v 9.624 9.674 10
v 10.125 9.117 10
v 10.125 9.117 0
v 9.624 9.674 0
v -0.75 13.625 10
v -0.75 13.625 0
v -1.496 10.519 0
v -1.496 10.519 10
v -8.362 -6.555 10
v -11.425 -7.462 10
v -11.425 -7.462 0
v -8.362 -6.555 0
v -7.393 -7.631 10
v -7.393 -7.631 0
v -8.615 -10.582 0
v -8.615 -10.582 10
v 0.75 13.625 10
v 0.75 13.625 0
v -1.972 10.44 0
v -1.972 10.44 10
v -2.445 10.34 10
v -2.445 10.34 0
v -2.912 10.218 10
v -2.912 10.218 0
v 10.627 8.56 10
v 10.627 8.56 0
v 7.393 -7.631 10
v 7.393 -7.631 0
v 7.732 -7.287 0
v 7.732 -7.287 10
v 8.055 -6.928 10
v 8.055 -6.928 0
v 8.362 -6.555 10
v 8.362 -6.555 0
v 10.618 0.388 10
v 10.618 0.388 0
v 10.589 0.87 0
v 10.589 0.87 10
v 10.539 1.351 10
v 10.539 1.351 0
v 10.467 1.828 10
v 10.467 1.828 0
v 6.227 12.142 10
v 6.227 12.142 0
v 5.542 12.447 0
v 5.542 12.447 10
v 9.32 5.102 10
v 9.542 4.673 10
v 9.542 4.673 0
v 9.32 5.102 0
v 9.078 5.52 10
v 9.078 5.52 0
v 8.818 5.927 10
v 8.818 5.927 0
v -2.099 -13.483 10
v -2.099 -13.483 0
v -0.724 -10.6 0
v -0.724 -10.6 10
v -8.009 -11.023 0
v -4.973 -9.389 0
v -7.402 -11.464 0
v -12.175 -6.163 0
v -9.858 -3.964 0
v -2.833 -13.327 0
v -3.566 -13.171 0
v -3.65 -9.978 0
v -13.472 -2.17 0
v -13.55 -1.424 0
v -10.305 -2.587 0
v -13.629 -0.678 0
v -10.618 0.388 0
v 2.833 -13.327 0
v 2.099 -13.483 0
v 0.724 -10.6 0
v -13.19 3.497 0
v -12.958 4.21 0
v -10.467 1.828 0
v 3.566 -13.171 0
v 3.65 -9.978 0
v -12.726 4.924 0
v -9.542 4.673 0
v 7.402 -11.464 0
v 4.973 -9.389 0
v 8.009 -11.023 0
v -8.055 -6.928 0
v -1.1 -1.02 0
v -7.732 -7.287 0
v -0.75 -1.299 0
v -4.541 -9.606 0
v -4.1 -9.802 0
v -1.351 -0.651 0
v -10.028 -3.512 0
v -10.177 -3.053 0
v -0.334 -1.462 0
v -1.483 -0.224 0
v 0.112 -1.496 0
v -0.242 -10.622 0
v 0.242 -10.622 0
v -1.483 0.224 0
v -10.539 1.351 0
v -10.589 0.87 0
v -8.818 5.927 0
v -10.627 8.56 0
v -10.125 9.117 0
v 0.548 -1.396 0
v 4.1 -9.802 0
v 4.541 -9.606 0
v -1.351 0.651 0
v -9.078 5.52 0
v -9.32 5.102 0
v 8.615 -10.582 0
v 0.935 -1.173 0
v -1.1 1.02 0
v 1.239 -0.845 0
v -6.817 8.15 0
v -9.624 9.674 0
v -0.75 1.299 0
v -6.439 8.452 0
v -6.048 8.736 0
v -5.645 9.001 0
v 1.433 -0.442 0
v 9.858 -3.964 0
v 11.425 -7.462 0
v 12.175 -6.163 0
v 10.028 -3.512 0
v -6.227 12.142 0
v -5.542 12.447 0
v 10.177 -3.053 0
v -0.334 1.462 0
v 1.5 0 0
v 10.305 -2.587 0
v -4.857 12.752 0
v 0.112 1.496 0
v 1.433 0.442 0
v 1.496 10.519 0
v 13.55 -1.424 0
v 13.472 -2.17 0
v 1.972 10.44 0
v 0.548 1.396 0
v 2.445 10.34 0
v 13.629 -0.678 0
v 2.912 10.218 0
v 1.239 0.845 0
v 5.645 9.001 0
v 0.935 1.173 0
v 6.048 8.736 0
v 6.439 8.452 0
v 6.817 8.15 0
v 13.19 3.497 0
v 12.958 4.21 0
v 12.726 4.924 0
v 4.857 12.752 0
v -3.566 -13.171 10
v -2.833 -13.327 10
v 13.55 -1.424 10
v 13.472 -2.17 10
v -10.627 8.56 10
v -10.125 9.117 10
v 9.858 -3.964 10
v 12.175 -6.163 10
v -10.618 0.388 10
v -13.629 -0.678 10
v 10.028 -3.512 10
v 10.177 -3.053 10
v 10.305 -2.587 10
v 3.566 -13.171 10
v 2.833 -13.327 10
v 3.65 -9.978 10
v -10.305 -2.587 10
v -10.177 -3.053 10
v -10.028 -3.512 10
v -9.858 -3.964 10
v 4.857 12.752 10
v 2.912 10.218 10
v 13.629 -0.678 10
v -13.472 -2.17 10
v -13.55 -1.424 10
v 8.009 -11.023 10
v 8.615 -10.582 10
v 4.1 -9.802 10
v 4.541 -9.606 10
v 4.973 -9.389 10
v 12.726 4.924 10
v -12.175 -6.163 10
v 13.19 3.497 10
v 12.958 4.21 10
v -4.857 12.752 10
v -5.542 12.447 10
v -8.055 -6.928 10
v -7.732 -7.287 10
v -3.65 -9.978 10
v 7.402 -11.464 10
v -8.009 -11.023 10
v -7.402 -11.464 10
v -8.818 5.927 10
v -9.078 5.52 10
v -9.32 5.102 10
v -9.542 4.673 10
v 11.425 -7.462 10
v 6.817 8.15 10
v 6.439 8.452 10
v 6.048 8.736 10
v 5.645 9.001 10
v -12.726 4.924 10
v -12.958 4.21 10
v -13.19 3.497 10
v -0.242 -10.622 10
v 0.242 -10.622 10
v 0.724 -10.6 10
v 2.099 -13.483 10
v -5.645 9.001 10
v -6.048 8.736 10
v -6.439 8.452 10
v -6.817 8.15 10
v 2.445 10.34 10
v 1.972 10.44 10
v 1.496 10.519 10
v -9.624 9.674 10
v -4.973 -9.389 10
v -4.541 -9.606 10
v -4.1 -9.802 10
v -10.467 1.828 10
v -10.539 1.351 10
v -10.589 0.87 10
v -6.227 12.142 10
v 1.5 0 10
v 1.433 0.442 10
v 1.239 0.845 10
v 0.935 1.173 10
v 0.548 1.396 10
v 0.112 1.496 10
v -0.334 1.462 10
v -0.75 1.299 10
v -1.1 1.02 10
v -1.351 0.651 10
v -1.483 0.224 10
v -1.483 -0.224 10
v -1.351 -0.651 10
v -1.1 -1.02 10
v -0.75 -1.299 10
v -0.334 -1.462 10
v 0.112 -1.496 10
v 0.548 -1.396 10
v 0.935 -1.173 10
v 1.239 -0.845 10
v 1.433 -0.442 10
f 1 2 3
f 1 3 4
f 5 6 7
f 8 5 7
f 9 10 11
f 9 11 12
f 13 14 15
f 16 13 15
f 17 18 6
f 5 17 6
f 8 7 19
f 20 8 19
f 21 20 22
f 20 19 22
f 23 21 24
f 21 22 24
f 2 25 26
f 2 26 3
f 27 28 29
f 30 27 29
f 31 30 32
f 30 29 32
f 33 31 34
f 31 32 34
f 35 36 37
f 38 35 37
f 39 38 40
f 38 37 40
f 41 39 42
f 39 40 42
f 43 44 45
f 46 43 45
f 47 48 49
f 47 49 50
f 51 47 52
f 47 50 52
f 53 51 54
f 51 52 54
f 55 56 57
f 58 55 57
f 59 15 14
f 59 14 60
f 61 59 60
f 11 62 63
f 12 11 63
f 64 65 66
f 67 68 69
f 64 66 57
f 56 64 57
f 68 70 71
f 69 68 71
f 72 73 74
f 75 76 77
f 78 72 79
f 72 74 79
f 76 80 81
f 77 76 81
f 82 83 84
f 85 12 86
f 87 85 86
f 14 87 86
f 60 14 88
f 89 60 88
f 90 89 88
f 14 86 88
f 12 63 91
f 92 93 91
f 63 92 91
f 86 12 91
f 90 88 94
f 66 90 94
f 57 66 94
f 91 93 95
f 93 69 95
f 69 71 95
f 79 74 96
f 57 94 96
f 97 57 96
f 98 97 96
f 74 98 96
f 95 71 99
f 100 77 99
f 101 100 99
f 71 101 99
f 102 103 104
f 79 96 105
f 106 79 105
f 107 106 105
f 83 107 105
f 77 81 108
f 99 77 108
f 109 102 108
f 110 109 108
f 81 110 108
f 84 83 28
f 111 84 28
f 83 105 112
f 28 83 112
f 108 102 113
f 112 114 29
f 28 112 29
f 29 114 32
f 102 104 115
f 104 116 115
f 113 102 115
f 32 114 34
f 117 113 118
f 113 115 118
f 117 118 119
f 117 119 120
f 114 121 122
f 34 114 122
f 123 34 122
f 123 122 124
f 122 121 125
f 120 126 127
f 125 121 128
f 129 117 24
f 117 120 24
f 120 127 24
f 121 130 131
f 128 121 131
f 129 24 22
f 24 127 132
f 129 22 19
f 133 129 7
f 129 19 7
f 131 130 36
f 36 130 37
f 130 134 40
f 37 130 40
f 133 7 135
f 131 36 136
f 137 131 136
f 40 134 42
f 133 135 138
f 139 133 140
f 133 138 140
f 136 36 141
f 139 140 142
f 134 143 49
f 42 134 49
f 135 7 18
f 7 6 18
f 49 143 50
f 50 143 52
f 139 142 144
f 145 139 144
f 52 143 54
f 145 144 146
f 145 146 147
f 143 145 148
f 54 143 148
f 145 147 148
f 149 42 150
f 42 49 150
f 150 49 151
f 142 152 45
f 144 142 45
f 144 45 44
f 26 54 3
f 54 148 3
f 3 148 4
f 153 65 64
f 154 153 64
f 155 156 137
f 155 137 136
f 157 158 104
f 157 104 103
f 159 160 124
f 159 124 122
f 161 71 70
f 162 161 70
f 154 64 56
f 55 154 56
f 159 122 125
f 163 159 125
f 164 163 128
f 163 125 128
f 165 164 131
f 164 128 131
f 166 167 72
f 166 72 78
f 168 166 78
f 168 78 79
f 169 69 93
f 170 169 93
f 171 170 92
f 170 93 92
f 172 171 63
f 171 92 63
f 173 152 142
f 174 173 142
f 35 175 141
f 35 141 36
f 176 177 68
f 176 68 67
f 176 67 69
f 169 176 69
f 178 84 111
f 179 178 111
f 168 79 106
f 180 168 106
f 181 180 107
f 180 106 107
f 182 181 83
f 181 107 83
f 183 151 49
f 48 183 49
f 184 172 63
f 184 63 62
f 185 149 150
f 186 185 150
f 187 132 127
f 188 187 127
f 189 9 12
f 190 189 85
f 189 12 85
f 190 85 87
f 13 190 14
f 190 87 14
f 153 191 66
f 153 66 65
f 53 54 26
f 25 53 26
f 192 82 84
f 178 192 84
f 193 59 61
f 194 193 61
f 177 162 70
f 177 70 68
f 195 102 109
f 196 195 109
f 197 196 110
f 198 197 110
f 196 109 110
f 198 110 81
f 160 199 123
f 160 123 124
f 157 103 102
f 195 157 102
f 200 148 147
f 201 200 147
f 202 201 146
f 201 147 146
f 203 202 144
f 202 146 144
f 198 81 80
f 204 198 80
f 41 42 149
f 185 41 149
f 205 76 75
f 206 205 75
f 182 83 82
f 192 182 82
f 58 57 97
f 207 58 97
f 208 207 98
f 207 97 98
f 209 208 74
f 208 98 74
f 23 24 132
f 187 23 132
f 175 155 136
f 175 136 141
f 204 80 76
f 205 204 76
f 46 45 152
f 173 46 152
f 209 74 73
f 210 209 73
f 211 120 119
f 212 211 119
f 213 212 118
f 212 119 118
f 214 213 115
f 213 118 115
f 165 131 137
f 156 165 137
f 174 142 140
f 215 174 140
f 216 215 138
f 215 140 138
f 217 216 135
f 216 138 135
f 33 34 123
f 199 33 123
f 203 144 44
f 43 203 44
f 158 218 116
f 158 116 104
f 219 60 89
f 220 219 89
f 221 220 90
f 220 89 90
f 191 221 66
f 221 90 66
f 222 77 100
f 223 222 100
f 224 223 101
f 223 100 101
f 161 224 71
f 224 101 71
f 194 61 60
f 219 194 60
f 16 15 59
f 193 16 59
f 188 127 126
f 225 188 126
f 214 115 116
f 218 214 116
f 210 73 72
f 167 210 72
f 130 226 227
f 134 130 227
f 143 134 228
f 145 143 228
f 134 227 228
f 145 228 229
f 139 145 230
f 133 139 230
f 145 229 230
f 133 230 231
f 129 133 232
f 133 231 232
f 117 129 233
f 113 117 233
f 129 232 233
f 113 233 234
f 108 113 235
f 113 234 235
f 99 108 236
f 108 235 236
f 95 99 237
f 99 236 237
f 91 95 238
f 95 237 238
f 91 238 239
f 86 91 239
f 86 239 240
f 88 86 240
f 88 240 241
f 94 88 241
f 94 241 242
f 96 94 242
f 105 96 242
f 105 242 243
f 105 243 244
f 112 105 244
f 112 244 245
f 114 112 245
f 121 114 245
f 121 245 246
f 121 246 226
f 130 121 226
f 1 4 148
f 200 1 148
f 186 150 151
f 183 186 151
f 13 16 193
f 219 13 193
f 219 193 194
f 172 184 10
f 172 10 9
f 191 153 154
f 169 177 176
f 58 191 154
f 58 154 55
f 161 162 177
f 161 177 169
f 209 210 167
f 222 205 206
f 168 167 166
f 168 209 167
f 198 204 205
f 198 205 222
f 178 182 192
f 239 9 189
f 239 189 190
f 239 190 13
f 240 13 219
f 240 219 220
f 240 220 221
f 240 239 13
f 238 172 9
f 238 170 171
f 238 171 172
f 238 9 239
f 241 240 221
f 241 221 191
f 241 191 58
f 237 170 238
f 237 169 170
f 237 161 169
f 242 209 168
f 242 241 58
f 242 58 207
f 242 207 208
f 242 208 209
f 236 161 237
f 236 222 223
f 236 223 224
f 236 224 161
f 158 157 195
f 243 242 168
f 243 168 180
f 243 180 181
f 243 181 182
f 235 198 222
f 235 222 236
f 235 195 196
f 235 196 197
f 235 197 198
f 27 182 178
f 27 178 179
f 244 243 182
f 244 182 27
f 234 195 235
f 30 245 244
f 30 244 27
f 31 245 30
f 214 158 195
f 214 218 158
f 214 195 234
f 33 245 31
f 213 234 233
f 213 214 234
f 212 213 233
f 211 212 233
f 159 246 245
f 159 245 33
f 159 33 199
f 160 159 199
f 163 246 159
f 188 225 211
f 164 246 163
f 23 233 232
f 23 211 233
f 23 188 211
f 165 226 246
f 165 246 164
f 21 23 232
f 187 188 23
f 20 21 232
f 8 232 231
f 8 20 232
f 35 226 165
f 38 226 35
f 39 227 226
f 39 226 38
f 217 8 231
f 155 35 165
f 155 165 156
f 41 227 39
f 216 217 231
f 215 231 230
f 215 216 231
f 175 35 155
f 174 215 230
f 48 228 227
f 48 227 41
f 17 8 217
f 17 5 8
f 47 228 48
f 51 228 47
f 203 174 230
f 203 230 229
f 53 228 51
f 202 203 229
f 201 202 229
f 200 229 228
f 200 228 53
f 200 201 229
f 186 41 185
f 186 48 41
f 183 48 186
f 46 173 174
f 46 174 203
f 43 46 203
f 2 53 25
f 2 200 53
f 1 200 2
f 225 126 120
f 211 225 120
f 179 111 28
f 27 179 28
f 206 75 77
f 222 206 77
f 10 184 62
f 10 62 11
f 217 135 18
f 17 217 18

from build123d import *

# Parameters (mm, degrees)
F1_DEPTH = 10
F2_R     = 1.5
F3_DEPTH = 10.001


with BuildPart() as f1:
    # F0 (on Top) → F1 (new body)
    with BuildSketch(Plane.XY):
        with BuildLine():
            ThreePointArc((10.305245, -2.586998), (10.544758, -1.303342), (10.625, 0))
            ThreePointArc((10.625, 0), (10.623229, 0.193975), (10.617917, 0.387885))
            ThreePointArc((10.617917, 0.387885), (10.566795, 1.110615), (10.466536, 1.82818))
            ThreePointArc((10.466536, 1.82818), (10.104975, 3.283306), (9.542183, 4.673047))
            ThreePointArc((9.542183, 4.673047), (9.20152, 5.3125), (8.818069, 5.927249))
            ThreePointArc((8.818069, 5.927249), (7.895914, 7.109513), (6.816518, 8.150196))
            ThreePointArc((6.816518, 8.150196), (6.245218, 8.595806), (5.644877, 9.001444))
            ThreePointArc((5.644877, 9.001444), (4.321577, 9.70642), (2.912216, 10.218103))
            ThreePointArc((2.912216, 10.218103), (2.209062, 10.392818), (1.495635, 10.519206))
            ThreePointArc((1.495635, 10.519206), (0, 10.625), (-1.495635, 10.519206))
            ThreePointArc((-1.495635, 10.519206), (-2.209062, 10.392818), (-2.912216, 10.218103))
            ThreePointArc((-2.912216, 10.218103), (-4.321577, 9.70642), (-5.644877, 9.001444))
            ThreePointArc((-5.644877, 9.001444), (-6.245218, 8.595806), (-6.816518, 8.150196))
            ThreePointArc((-6.816518, 8.150196), (-7.895914, 7.109513), (-8.818069, 5.927249))
            ThreePointArc((-8.818069, 5.927249), (-9.20152, 5.3125), (-9.542183, 4.673047))
            ThreePointArc((-9.542183, 4.673047), (-10.104975, 3.283306), (-10.466536, 1.82818))
            ThreePointArc((-10.466536, 1.82818), (-10.566795, 1.110615), (-10.617917, 0.387885))
            ThreePointArc((-10.617917, 0.387885), (-10.566795, -1.110615), (-10.305245, -2.586998))
            ThreePointArc((-10.305245, -2.586998), (-10.104975, -3.283306), (-9.857717, -3.964345))
            ThreePointArc((-9.857717, -3.964345), (-9.20152, -5.3125), (-8.362082, -6.554861))
            ThreePointArc((-8.362082, -6.554861), (-7.895914, -7.109513), (-7.393029, -7.631104))
            ThreePointArc((-7.393029, -7.631104), (-6.245218, -8.595806), (-4.97304, -9.389329))
            ThreePointArc((-4.97304, -9.389329), (-4.321577, -9.70642), (-3.650018, -9.978376))
            ThreePointArc((-3.650018, -9.978376), (-2.209062, -10.392818), (-0.724114, -10.600296))
            ThreePointArc((-0.724114, -10.600296), (0, -10.625), (0.724114, -10.600296))
            ThreePointArc((0.724114, -10.600296), (2.209062, -10.392818), (3.650018, -9.978376))
            ThreePointArc((3.650018, -9.978376), (4.321577, -9.70642), (4.97304, -9.389329))
            ThreePointArc((4.97304, -9.389329), (6.245218, -8.595806), (7.393029, -7.631104))
            ThreePointArc((7.393029, -7.631104), (7.895914, -7.109513), (8.362082, -6.554861))
            ThreePointArc((8.362082, -6.554861), (9.20152, -5.3125), (9.857717, -3.964345))
            ThreePointArc((9.857717, -3.964345), (10.104975, -3.283306), (10.305245, -2.586998))
        make_face()
        with BuildLine():
            ThreePointArc((10.617917, 0.387885), (10.623229, 0.193975), (10.625, 0))
            ThreePointArc((10.625, 0), (10.544758, -1.303342), (10.305245, -2.586998))
            Line((10.305245, -2.586998), (13.471964, -2.170092))
            Line((13.471964, -2.170092), (13.550361, -1.4242))
            Line((13.550361, -1.4242), (13.628757, -0.678309))
            Line((13.628757, -0.678309), (10.617917, 0.387885))
        make_face()
        with BuildLine():
            ThreePointArc((9.542183, 4.673047), (10.104975, 3.283306), (10.466536, 1.82818))
            Line((10.466536, 1.82818), (13.189908, 3.497064))
            Line((13.189908, 3.497064), (12.958145, 4.210357))
            Line((12.958145, 4.210357), (12.726382, 4.923649))
            Line((12.726382, 4.923649), (9.542183, 4.673047))
        make_face()
        with BuildLine():
            Line((12.174596, -6.162981), (9.857717, -3.964345))
            ThreePointArc((9.857717, -3.964345), (9.20152, -5.3125), (8.362082, -6.554861))
            Line((8.362082, -6.554861), (11.424596, -7.462019))
            Line((11.424596, -7.462019), (11.799596, -6.8125))
            Line((11.799596, -6.8125), (12.174596, -6.162981))
        make_face()
        with BuildLine():
            ThreePointArc((6.816518, 8.150196), (7.895914, 7.109513), (8.818069, 5.927249))
            Line((8.818069, 5.927249), (10.627196, 8.559546))
            Line((10.627196, 8.559546), (10.125348, 9.116905))
            Line((10.125348, 9.116905), (9.6235, 9.674263))
            Line((9.6235, 9.674263), (6.816518, 8.150196))
        make_face()
        with BuildLine():
            Line((8.615337, -10.582018), (7.393029, -7.631104))
            ThreePointArc((7.393029, -7.631104), (6.245218, -8.595806), (4.97304, -9.389329))
            Line((4.97304, -9.389329), (7.401811, -11.463695))
            Line((7.401811, -11.463695), (8.008574, -11.022857))
            Line((8.008574, -11.022857), (8.615337, -10.582018))
        make_face()
        with BuildLine():
            ThreePointArc((2.912216, 10.218103), (4.321577, 9.70642), (5.644877, 9.001444))
            Line((5.644877, 9.001444), (6.226946, 12.142004))
            Line((6.226946, 12.142004), (5.541787, 12.447057))
            Line((5.541787, 12.447057), (4.856628, 12.752109))
            Line((4.856628, 12.752109), (2.912216, 10.218103))
        make_face()
        with BuildLine():
            Line((3.566407, -13.171327), (3.650018, -9.978376))
            ThreePointArc((3.650018, -9.978376), (2.209062, -10.392818), (0.724114, -10.600296))
            Line((0.724114, -10.600296), (2.099186, -13.483195))
            Line((2.099186, -13.483195), (2.832797, -13.327261))
            Line((2.832797, -13.327261), (3.566407, -13.171327))
        make_face()
        with BuildLine():
            ThreePointArc((-1.495635, 10.519206), (0, 10.625), (1.495635, 10.519206))
            Line((1.495635, 10.519206), (0.75, 13.625))
            Line((0.75, 13.625), (0, 13.625))
            Line((0, 13.625), (-0.75, 13.625))
            Line((-0.75, 13.625), (-1.495635, 10.519206))
        make_face()
        with BuildLine():
            Line((-2.099186, -13.483195), (-0.724114, -10.600296))
            ThreePointArc((-0.724114, -10.600296), (-2.209062, -10.392818), (-3.650018, -9.978376))
            Line((-3.650018, -9.978376), (-3.566407, -13.171327))
            Line((-3.566407, -13.171327), (-2.832797, -13.327261))
            Line((-2.832797, -13.327261), (-2.099186, -13.483195))
        make_face()
        with BuildLine():
            ThreePointArc((-5.644877, 9.001444), (-4.321577, 9.70642), (-2.912216, 10.218103))
            Line((-2.912216, 10.218103), (-4.856628, 12.752109))
            Line((-4.856628, 12.752109), (-5.541787, 12.447057))
            Line((-5.541787, 12.447057), (-6.226946, 12.142004))
            Line((-6.226946, 12.142004), (-5.644877, 9.001444))
        make_face()
        with BuildLine():
            Line((-7.401811, -11.463695), (-4.97304, -9.389329))
            ThreePointArc((-4.97304, -9.389329), (-6.245218, -8.595806), (-7.393029, -7.631104))
            Line((-7.393029, -7.631104), (-8.615337, -10.582018))
            Line((-8.615337, -10.582018), (-8.008574, -11.022857))
            Line((-8.008574, -11.022857), (-7.401811, -11.463695))
        make_face()
        with BuildLine():
            ThreePointArc((-8.818069, 5.927249), (-7.895914, 7.109513), (-6.816518, 8.150196))
            Line((-6.816518, 8.150196), (-9.6235, 9.674263))
            Line((-9.6235, 9.674263), (-10.125348, 9.116905))
            Line((-10.125348, 9.116905), (-10.627196, 8.559546))
            Line((-10.627196, 8.559546), (-8.818069, 5.927249))
        make_face()
        with BuildLine():
            Line((-11.424596, -7.462019), (-8.362082, -6.554861))
            ThreePointArc((-8.362082, -6.554861), (-9.20152, -5.3125), (-9.857717, -3.964345))
            Line((-9.857717, -3.964345), (-12.174596, -6.162981))
            Line((-12.174596, -6.162981), (-11.799596, -6.8125))
            Line((-11.799596, -6.8125), (-11.424596, -7.462019))
        make_face()
        with BuildLine():
            ThreePointArc((-10.466536, 1.82818), (-10.104975, 3.283306), (-9.542183, 4.673047))
            Line((-9.542183, 4.673047), (-12.726382, 4.923649))
            Line((-12.726382, 4.923649), (-12.958145, 4.210357))
            Line((-12.958145, 4.210357), (-13.189908, 3.497064))
            Line((-13.189908, 3.497064), (-10.466536, 1.82818))
        make_face()
        with BuildLine():
            Line((-13.471964, -2.170092), (-10.305245, -2.586998))
            ThreePointArc((-10.305245, -2.586998), (-10.566795, -1.110615), (-10.617917, 0.387885))
            Line((-10.617917, 0.387885), (-13.628757, -0.678309))
            Line((-13.628757, -0.678309), (-13.550361, -1.4242))
            Line((-13.550361, -1.4242), (-13.471964, -2.170092))
        make_face()
    extrude(amount=F1_DEPTH)

    # F2 (on face) → F3 (cut, through all)
    with BuildSketch(Plane.XY.offset(10)):
        Circle(F2_R)
    extrude(amount=-F3_DEPTH, mode=Mode.SUBTRACT)


solid = f1.part
